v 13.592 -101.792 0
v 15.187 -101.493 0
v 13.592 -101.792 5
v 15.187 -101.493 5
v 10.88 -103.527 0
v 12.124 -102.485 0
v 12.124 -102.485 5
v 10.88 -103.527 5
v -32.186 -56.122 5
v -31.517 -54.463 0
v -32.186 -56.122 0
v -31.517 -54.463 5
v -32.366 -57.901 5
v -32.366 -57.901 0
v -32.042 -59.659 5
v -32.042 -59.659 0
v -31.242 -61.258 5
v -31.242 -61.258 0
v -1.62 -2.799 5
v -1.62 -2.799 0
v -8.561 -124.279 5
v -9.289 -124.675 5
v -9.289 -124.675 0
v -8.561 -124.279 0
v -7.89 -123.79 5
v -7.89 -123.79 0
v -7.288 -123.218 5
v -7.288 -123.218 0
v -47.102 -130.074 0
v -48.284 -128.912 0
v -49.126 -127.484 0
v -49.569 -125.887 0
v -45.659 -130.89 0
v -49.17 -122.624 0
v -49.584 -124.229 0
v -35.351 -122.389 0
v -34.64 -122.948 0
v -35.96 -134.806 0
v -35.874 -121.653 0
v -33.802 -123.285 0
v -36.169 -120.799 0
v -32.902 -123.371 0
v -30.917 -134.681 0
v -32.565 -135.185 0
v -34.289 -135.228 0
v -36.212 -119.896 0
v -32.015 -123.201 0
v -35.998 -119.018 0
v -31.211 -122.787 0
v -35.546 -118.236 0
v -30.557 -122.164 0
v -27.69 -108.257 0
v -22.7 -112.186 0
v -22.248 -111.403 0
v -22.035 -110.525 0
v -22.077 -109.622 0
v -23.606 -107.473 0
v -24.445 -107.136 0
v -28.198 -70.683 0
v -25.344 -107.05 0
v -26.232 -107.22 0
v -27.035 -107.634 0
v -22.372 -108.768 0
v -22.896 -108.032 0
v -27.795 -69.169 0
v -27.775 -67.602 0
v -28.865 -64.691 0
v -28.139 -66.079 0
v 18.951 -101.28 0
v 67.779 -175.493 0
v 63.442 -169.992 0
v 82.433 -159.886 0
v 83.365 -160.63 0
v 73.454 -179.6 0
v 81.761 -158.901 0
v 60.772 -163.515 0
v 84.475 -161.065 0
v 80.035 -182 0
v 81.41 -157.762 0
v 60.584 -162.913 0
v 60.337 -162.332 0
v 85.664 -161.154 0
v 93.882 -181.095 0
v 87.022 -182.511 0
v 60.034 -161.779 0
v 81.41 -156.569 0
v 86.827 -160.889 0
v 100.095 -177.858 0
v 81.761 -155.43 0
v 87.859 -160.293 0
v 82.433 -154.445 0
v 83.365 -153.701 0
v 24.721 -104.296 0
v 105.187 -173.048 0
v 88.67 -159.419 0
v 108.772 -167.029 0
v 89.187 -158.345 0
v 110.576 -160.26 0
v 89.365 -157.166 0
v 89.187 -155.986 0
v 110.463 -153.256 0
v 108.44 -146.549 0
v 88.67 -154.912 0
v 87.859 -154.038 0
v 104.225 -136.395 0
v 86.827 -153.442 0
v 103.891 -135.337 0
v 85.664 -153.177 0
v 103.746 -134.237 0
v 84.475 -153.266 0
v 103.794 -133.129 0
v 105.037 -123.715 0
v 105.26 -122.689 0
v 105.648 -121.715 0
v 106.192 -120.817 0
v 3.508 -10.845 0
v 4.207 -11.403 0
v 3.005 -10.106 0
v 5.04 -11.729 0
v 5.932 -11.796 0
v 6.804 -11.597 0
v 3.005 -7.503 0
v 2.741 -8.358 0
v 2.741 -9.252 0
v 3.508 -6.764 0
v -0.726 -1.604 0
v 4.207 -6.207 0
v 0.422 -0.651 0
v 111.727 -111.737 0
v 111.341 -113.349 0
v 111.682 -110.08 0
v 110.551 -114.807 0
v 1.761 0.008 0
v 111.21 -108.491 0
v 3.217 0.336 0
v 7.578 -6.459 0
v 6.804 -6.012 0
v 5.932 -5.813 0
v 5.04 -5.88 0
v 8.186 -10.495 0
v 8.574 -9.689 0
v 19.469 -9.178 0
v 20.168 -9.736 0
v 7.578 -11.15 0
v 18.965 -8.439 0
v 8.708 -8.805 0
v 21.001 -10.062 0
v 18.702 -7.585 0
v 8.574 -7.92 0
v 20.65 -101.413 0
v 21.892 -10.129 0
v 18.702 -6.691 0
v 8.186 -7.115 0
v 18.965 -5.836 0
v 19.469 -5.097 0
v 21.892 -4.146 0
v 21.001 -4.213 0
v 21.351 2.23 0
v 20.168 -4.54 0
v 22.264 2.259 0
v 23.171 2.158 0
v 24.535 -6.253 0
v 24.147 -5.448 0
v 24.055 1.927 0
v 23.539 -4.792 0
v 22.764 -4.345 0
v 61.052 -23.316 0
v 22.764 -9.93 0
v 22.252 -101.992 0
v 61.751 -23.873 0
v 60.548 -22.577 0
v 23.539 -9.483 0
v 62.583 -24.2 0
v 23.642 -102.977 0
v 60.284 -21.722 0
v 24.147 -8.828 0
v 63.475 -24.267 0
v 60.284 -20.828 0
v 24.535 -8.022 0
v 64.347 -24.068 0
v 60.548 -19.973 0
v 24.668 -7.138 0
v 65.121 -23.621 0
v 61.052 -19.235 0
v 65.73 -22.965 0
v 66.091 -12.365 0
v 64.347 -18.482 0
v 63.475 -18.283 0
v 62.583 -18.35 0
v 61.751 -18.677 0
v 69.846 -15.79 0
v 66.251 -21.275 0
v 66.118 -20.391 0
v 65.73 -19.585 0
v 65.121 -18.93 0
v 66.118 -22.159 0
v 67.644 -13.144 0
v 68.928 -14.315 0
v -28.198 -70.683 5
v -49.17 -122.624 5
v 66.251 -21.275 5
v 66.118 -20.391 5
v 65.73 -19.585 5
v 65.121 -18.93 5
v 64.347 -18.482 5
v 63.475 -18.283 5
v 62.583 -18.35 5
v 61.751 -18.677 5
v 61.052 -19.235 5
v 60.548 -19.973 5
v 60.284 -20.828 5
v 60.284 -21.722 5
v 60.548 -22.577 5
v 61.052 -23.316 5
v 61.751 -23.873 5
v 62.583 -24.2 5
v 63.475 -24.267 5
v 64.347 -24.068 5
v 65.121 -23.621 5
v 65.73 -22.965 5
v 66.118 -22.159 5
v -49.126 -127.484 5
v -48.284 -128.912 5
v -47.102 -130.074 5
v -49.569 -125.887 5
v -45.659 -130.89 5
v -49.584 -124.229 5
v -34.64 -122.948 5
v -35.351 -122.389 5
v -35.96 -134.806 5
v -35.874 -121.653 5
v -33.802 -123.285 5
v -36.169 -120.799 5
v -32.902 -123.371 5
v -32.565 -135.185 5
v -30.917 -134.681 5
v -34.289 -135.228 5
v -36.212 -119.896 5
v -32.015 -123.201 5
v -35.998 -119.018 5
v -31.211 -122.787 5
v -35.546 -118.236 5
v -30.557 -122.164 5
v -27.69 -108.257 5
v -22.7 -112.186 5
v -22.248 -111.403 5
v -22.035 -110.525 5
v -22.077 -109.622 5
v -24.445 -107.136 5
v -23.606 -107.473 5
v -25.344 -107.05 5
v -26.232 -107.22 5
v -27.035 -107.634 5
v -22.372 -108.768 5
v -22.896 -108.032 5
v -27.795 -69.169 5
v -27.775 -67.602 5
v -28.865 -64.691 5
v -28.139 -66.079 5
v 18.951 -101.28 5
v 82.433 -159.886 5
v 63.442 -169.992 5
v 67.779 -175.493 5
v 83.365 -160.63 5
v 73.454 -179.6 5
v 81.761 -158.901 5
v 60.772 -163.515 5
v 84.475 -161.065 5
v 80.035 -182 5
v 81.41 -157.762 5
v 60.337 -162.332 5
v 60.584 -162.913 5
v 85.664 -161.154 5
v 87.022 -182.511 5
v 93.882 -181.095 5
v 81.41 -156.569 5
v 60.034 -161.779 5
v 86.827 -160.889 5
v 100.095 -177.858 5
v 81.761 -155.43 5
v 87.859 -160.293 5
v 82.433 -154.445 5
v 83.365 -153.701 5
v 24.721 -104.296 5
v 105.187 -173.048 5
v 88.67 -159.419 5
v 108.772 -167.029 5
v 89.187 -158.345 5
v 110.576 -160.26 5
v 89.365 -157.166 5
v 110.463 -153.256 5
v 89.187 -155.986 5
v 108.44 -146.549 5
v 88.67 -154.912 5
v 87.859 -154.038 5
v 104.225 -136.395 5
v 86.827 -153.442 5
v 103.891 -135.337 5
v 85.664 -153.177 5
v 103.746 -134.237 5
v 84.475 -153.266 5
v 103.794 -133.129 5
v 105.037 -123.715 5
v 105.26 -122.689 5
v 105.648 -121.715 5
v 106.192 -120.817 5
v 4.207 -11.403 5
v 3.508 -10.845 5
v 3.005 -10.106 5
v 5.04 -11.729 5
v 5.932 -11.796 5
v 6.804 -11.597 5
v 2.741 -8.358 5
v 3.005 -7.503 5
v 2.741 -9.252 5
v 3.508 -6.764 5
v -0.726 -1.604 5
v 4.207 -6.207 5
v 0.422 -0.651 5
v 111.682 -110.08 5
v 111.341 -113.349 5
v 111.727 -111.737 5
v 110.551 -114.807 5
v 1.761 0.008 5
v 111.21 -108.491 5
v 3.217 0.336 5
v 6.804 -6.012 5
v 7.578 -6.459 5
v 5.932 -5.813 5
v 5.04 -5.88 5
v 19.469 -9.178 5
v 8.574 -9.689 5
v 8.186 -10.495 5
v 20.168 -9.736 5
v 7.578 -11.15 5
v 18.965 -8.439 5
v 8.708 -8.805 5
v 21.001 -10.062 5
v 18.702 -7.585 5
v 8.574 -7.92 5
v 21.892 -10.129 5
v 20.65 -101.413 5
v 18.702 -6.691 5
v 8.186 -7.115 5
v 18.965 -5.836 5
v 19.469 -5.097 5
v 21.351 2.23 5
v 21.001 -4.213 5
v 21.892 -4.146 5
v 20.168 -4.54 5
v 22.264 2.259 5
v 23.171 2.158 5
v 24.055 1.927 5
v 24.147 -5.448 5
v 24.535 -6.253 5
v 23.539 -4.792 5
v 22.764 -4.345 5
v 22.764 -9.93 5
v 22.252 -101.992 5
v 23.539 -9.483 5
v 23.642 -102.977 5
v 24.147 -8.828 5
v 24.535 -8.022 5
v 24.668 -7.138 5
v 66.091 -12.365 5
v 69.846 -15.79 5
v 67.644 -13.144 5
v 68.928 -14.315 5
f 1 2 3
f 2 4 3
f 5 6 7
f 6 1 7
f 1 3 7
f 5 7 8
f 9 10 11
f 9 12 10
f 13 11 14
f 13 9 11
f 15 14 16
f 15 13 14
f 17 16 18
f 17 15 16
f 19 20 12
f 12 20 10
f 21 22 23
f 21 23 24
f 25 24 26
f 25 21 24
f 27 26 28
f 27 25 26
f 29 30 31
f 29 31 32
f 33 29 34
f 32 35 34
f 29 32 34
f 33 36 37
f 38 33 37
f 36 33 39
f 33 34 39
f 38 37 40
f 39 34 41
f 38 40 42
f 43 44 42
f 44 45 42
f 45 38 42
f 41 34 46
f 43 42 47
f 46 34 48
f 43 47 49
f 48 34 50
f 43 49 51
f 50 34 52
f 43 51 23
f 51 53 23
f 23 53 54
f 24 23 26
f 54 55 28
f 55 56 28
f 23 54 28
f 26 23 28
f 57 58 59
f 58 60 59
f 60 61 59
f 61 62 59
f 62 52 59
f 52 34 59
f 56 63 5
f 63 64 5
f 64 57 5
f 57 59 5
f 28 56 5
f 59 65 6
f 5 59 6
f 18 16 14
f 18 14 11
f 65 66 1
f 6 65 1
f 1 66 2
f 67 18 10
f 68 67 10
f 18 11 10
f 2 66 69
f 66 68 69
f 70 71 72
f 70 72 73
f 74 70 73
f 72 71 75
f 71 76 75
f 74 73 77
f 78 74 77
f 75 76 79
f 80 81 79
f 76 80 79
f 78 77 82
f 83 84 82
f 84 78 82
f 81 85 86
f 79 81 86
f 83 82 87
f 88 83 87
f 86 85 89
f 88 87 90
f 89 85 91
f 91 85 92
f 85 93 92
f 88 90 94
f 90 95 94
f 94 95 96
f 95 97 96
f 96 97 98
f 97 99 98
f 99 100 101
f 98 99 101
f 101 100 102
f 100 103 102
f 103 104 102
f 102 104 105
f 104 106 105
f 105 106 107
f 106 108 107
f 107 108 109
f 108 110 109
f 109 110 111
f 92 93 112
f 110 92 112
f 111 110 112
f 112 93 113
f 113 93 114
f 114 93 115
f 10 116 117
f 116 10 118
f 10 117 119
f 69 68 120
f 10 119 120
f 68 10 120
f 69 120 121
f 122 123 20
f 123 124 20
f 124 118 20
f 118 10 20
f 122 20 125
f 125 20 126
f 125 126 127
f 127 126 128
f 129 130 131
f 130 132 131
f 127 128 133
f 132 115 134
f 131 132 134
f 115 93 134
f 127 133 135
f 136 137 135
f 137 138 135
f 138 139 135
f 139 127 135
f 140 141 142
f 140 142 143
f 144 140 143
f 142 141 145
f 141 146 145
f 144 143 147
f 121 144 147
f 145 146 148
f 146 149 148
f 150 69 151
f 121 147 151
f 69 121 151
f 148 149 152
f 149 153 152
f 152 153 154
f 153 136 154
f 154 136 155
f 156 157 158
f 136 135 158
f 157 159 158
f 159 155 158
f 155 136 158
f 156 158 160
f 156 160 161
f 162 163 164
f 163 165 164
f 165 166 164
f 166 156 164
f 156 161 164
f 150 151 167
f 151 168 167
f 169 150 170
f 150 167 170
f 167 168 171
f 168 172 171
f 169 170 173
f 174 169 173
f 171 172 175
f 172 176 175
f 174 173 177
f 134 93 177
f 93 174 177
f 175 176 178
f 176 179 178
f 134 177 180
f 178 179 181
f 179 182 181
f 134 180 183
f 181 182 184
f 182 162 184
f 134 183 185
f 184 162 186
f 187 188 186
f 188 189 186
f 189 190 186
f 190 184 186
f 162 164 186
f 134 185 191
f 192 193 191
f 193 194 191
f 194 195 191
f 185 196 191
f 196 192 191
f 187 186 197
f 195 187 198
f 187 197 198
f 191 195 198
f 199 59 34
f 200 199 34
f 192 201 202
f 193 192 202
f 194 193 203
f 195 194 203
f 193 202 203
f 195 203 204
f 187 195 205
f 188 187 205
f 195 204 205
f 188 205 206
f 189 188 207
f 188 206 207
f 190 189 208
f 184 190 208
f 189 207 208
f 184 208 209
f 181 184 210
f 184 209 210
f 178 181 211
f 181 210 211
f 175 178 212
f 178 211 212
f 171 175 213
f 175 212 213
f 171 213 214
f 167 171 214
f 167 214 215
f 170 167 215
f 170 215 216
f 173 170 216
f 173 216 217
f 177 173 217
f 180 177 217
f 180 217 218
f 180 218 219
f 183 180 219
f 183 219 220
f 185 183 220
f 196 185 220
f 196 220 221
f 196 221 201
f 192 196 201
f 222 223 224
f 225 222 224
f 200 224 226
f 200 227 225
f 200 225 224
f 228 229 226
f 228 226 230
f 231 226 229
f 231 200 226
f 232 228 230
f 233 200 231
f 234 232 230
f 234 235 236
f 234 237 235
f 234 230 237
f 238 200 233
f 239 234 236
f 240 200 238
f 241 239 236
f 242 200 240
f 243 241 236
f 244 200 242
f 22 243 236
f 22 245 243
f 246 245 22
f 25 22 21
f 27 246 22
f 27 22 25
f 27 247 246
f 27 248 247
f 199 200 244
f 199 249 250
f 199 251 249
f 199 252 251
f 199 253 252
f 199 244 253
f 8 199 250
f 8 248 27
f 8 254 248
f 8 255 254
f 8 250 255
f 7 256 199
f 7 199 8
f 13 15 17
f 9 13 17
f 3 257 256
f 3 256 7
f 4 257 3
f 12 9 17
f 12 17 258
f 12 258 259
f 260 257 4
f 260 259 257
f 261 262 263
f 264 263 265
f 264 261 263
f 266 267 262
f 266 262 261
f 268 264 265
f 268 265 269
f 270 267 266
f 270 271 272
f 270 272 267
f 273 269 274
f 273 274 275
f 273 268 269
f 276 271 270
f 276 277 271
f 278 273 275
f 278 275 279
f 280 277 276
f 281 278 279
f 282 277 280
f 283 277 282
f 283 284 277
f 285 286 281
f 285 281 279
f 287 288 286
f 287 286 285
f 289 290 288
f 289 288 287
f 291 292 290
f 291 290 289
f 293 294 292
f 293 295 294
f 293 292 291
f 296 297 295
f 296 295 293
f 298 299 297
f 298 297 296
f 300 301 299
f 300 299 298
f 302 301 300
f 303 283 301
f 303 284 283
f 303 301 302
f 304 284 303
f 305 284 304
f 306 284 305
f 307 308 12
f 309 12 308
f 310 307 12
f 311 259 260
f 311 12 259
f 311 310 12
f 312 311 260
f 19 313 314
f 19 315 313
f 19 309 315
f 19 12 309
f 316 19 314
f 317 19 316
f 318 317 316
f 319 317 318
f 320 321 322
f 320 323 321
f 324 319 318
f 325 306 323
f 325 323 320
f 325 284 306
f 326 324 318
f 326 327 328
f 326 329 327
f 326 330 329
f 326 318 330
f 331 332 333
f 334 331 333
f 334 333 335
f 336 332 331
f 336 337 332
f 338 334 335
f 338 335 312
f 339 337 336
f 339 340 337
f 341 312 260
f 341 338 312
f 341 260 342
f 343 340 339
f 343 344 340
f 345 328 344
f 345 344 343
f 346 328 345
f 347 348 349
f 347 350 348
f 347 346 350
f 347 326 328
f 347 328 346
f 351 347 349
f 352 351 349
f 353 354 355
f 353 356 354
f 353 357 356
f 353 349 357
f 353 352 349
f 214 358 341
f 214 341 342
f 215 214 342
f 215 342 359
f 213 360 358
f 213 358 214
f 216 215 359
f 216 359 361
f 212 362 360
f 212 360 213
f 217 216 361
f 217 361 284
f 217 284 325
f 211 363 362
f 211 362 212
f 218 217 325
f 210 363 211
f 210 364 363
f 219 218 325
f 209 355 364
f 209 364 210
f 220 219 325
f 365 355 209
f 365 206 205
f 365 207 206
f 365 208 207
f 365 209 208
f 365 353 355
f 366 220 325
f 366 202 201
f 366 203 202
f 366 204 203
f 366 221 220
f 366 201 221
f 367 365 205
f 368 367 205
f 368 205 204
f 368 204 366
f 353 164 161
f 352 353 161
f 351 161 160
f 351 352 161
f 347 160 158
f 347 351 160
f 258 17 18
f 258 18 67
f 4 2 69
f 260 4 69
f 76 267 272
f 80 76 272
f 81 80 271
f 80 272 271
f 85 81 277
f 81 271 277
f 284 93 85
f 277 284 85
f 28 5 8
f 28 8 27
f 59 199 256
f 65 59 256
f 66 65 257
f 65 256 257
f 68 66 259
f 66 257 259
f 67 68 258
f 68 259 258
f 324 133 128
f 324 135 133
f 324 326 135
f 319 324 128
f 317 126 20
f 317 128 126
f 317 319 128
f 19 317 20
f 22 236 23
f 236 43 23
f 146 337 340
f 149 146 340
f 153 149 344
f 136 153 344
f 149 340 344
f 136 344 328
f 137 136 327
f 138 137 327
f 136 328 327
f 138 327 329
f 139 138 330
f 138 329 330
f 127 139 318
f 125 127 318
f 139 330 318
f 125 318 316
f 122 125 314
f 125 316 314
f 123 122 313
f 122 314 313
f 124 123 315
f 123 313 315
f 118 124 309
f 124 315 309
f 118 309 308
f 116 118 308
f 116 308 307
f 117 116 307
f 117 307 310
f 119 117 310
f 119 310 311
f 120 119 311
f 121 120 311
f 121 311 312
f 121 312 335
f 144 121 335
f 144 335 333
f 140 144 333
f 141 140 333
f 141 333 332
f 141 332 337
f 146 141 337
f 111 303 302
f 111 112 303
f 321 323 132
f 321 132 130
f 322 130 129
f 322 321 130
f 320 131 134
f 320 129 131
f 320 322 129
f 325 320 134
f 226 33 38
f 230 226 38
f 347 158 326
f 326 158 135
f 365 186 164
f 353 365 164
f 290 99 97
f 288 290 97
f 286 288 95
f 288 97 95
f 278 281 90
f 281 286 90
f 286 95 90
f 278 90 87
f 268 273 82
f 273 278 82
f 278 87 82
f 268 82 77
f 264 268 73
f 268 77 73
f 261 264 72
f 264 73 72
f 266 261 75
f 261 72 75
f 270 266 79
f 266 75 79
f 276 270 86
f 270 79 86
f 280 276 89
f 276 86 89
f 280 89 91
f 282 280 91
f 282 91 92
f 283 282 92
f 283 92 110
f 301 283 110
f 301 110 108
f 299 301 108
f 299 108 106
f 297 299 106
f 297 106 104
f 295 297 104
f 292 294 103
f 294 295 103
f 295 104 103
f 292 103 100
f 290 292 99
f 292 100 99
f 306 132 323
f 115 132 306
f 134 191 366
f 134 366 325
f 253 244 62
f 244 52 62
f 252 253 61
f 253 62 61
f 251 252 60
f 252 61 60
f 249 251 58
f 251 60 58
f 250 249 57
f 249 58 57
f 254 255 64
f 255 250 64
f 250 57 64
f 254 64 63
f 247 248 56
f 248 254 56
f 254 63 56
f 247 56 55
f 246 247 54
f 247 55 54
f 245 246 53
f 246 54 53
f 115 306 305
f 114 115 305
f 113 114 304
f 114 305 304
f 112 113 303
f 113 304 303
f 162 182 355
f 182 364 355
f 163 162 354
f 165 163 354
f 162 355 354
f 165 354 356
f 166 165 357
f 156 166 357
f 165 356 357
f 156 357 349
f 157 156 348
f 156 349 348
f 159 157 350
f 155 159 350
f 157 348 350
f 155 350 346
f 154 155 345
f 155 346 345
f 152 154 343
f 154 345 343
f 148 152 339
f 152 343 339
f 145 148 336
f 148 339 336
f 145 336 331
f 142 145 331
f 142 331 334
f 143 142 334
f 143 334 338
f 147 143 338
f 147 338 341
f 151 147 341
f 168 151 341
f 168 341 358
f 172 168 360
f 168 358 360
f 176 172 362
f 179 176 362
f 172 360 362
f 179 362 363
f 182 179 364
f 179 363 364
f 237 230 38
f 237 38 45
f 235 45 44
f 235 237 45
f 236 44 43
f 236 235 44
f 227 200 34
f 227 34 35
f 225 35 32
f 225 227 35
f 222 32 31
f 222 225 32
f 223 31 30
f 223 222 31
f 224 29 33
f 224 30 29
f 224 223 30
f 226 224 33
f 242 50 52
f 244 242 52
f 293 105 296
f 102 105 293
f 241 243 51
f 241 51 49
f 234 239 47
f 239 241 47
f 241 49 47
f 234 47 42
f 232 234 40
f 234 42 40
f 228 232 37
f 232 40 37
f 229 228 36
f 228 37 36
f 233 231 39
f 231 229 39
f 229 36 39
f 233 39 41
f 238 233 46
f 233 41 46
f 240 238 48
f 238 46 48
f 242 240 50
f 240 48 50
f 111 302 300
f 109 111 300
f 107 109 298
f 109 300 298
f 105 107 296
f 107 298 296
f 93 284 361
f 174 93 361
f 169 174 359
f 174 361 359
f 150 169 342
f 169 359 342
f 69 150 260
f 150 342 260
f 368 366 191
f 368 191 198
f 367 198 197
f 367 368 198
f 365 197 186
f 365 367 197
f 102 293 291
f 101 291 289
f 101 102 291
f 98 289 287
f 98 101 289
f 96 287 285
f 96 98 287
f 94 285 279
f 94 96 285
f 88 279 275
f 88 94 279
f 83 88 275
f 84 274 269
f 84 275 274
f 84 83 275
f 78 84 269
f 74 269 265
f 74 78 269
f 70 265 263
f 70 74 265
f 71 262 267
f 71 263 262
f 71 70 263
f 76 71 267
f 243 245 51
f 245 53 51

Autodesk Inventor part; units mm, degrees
ref_plane "YZ Plane" through (0, 0, 0) normal (1, 0, 0) x (0, 1, 0)
ref_plane "XZ Plane" through (0, 0, 0) normal (0, 1, 0) x (-1, 0, 0)
ref_plane "XY Plane" through (0, 0, 0) normal (0, 0, 1) x (1, 0, 0)
sketch "Base" plane through (0, 0, 0) normal (0, 0, 1) x (1, 0, 0)
  line L0 (0, 0) -> (-33.5334, -57.9479)
  line L1 (22.7363, 2.3748) -> (0, 0)
  line L2 (68.7163, -13.2577) -> (22.7363, 2.3748)
  line L3 (-33.5334, -57.9479) -> (-26.9158, -67.5067)
  line L4 (-26.9158, -67.5067) -> (-51.547, -128.5125)
  line L5 (-51.547, -128.5125) -> (-33.4114, -135.8348)
  line L6 (-26.9158, -67.5067) -> (12.6221, -101.6388) construction
  line L7 (12.6221, -101.6388) -> (22.7363, -101.0656)
  line L8 (12.6221, -101.6388) -> (-8.1441, -124.1457)
  line L9 (-33.4114, -135.8348) -> (-8.1441, -124.1457)
  line L10 (22.7363, 2.3748) -> (68.7163, -13.2577)
  line L11 (68.7163, -13.2577) -> (112.7039, -111.8391)
  line L12 (22.7363, 2.3748) -> (22.7363, -101.0656) construction
  line L13 (22.7363, -101.0656) -> (65.9464, -171.4033)
  line L14 (112.7039, -111.8391) -> (105.2475, -122.1197)
  line L15 (22.7363, -101.0656) -> (112.7039, -111.8391) construction
  line L16 (105.2475, -122.1197) -> (103.571, -134.8197)
  line L17 (103.571, -134.8197) -> (108.4402, -146.5492)
  line L18 (65.9464, -171.4033) -> (74.9694, -180.3406)
  line L19 (108.4402, -146.5492) -> (74.9694, -180.3406)
  circle A0 centre (85.3652, -157.1655) radius 25.4
  line L20 (-42.4792, -132.1736) -> (22.7363, -49.3454) construction
  line L21 (-33.0514, -120.1997) -> (-25.1949, -110.2215) construction
  line L22 (-35.546, -118.2356) -> (-27.6895, -108.2573)
  line L23 (-22.7004, -112.1856) -> (-30.5568, -122.1638)
  arc A1 (-35.546, -118.2356) -> (-30.5568, -122.1638) centre (-33.0514, -120.1997) ccw
  arc A2 (-22.7004, -112.1856) -> (-27.6895, -108.2573) centre (-25.1949, -110.2215) ccw
  circle A3 centre (85.3652, -157.1655) radius 4
  line L24 (0, -219.5535) -> (0, 39.3628)
  point P0 (-29.1232, -115.2106)
  point P1 (60.5618, -162.6381)
  dimension "d4" = 50.8
  dimension "d5" = 22.86
  dimension "d6" = 155.26
  dimension "d7" = 126.02
  dimension "d8" = 48.5647
  dimension "d9" = 66.9511
  dimension "d10" = 132.824
  dimension "d11" = 107.95
  dimension "d12" = 115.248
  dimension "d13" = 11.6259
  dimension "d14" = 65.7906
  dimension "d15" = 19.558
  dimension "d16" = 120
  dimension "d17" = 12.7
  dimension "d18" = 12.7
  dimension "d19" = 12.7
  dimension "d20" = 82.55
  dimension "d21" = 12.7
  dimension "d24" = 15.24
  dimension "d26" = 12.7
  dimension "d31" = 8
  dimension "d32" = 95.963
  dimension "d33" = 38.215
  dimension "d34" = 22.545
  dimension "d35" = 7.52
  dimension "d36" = 44.727
  dimension "d37" = 31.563
  dimension "d38" = 86.757
  dimension "d39" = 42.697
  dimension "d40" = 49.197
  dimension "d41" = 114.826
  dimension "d47" = 105.4209
  dimension "d48" = 62.051
  dimension "d75" = 3.175
extrude "Plate1" add sketch "Base" along normal blind 5
fillet "OutsideFilletsFeature" radius 6.35 14 edges at (68.7163, -13.2577, 2.5) (22.7363, 2.3748, 2.5) (0, 0, 2.5) (-33.5334, -57.9479, 2.5) (-26.9158, -67.5067, 2.5) (-51.547, -128.5125, 2.5) (-33.4114, -135.8348, 2.5) (-8.1441, -124.1457, 2.5) (12.6221, -101.6388, 2.5) (22.7363, -101.0656, 2.5) (60.5618, -162.6381, 2.5) (103.571, -134.8197, 2.5) (105.2475, -122.1197, 2.5) (112.7039, -111.8391, 2.5)
sketch "MountHoles" plane through (0, 0, 5) normal (0, 0, 1) x (1, 0, 0)
  line L0 (-1.6199, -2.7989) -> (-30.9807, -53.5288) construction
  arc A0 (3.2163, 0.3359) -> (-1.6199, -2.7989) centre (3.876, -5.9797) ccw construction
  line L1 (21.3511, 2.2301) -> (3.2163, 0.3359) construction
  arc A1 (24.0549, 1.9264) -> (21.3511, 2.2301) centre (22.0108, -4.0856) ccw construction
  arc A2 (69.8461, -15.7897) -> (66.0912, -12.3652) centre (64.0472, -18.3772) ccw construction
  line L2 (24.0548, 1.9265) -> (66.0912, -12.3652) construction
  line L3 (66.0912, -12.3652) -> (24.0548, 1.9265) construction
  line L4 (-20.7142, -54.4632) -> (5.7075, -8.8047) construction
  line L5 (5.7075, -8.8047) -> (21.6681, -7.1377) construction
  line L6 (21.6681, -7.1377) -> (66.0912, -22.2408) construction
  line L7 (-31.5169, -54.4632) -> (-1.6198, -2.7992) construction
  line L8 (3.2166, 0.336) -> (21.3512, 2.2301) construction
  line L9 (24.0548, 1.9265) -> (66.0912, -12.3652) construction
  line L10 (-31.5169, -54.4632) -> (-20.7142, -54.4632) construction
  line L11 (66.0912, -22.2408) -> (66.0912, -12.3652) construction
  circle A3 centre (5.7075, -8.8047) radius 3
  circle A4 centre (21.6681, -7.1377) radius 3
  circle A5 centre (63.2509, -21.2751) radius 3
  point P0 (0, 0)
  dimension "d49" = 9.35
  dimension "d50" = 9.35
  dimension "d51" = 9.35
  dimension "d52" = 6
  dimension "d53" = 6
  dimension "d54" = 6
  dimension "d55" = 3
extrude "MountHolesFeature" cut sketch "MountHoles" against normal blind 5
equation "\"d50\" = d49"
equation "\"d51\" = d49"
equation "\"d56\" = Thickness"
equation "\"d42\" = Thickness"
equation "\"BendRadius\" = Thickness"
equation "\"BendReliefWidth\" = Thickness"
equation "\"BendReliefDepth\" = 0.5 * Thickness"
equation "\"TransitionRadius\" = BendRadius"
equation "\"JacobiRadiusSize\" = BendRadius"
equation "\"GapSize\" = Thickness"
equation "\"Thickness\" = 5"
properties part number "Knee"
